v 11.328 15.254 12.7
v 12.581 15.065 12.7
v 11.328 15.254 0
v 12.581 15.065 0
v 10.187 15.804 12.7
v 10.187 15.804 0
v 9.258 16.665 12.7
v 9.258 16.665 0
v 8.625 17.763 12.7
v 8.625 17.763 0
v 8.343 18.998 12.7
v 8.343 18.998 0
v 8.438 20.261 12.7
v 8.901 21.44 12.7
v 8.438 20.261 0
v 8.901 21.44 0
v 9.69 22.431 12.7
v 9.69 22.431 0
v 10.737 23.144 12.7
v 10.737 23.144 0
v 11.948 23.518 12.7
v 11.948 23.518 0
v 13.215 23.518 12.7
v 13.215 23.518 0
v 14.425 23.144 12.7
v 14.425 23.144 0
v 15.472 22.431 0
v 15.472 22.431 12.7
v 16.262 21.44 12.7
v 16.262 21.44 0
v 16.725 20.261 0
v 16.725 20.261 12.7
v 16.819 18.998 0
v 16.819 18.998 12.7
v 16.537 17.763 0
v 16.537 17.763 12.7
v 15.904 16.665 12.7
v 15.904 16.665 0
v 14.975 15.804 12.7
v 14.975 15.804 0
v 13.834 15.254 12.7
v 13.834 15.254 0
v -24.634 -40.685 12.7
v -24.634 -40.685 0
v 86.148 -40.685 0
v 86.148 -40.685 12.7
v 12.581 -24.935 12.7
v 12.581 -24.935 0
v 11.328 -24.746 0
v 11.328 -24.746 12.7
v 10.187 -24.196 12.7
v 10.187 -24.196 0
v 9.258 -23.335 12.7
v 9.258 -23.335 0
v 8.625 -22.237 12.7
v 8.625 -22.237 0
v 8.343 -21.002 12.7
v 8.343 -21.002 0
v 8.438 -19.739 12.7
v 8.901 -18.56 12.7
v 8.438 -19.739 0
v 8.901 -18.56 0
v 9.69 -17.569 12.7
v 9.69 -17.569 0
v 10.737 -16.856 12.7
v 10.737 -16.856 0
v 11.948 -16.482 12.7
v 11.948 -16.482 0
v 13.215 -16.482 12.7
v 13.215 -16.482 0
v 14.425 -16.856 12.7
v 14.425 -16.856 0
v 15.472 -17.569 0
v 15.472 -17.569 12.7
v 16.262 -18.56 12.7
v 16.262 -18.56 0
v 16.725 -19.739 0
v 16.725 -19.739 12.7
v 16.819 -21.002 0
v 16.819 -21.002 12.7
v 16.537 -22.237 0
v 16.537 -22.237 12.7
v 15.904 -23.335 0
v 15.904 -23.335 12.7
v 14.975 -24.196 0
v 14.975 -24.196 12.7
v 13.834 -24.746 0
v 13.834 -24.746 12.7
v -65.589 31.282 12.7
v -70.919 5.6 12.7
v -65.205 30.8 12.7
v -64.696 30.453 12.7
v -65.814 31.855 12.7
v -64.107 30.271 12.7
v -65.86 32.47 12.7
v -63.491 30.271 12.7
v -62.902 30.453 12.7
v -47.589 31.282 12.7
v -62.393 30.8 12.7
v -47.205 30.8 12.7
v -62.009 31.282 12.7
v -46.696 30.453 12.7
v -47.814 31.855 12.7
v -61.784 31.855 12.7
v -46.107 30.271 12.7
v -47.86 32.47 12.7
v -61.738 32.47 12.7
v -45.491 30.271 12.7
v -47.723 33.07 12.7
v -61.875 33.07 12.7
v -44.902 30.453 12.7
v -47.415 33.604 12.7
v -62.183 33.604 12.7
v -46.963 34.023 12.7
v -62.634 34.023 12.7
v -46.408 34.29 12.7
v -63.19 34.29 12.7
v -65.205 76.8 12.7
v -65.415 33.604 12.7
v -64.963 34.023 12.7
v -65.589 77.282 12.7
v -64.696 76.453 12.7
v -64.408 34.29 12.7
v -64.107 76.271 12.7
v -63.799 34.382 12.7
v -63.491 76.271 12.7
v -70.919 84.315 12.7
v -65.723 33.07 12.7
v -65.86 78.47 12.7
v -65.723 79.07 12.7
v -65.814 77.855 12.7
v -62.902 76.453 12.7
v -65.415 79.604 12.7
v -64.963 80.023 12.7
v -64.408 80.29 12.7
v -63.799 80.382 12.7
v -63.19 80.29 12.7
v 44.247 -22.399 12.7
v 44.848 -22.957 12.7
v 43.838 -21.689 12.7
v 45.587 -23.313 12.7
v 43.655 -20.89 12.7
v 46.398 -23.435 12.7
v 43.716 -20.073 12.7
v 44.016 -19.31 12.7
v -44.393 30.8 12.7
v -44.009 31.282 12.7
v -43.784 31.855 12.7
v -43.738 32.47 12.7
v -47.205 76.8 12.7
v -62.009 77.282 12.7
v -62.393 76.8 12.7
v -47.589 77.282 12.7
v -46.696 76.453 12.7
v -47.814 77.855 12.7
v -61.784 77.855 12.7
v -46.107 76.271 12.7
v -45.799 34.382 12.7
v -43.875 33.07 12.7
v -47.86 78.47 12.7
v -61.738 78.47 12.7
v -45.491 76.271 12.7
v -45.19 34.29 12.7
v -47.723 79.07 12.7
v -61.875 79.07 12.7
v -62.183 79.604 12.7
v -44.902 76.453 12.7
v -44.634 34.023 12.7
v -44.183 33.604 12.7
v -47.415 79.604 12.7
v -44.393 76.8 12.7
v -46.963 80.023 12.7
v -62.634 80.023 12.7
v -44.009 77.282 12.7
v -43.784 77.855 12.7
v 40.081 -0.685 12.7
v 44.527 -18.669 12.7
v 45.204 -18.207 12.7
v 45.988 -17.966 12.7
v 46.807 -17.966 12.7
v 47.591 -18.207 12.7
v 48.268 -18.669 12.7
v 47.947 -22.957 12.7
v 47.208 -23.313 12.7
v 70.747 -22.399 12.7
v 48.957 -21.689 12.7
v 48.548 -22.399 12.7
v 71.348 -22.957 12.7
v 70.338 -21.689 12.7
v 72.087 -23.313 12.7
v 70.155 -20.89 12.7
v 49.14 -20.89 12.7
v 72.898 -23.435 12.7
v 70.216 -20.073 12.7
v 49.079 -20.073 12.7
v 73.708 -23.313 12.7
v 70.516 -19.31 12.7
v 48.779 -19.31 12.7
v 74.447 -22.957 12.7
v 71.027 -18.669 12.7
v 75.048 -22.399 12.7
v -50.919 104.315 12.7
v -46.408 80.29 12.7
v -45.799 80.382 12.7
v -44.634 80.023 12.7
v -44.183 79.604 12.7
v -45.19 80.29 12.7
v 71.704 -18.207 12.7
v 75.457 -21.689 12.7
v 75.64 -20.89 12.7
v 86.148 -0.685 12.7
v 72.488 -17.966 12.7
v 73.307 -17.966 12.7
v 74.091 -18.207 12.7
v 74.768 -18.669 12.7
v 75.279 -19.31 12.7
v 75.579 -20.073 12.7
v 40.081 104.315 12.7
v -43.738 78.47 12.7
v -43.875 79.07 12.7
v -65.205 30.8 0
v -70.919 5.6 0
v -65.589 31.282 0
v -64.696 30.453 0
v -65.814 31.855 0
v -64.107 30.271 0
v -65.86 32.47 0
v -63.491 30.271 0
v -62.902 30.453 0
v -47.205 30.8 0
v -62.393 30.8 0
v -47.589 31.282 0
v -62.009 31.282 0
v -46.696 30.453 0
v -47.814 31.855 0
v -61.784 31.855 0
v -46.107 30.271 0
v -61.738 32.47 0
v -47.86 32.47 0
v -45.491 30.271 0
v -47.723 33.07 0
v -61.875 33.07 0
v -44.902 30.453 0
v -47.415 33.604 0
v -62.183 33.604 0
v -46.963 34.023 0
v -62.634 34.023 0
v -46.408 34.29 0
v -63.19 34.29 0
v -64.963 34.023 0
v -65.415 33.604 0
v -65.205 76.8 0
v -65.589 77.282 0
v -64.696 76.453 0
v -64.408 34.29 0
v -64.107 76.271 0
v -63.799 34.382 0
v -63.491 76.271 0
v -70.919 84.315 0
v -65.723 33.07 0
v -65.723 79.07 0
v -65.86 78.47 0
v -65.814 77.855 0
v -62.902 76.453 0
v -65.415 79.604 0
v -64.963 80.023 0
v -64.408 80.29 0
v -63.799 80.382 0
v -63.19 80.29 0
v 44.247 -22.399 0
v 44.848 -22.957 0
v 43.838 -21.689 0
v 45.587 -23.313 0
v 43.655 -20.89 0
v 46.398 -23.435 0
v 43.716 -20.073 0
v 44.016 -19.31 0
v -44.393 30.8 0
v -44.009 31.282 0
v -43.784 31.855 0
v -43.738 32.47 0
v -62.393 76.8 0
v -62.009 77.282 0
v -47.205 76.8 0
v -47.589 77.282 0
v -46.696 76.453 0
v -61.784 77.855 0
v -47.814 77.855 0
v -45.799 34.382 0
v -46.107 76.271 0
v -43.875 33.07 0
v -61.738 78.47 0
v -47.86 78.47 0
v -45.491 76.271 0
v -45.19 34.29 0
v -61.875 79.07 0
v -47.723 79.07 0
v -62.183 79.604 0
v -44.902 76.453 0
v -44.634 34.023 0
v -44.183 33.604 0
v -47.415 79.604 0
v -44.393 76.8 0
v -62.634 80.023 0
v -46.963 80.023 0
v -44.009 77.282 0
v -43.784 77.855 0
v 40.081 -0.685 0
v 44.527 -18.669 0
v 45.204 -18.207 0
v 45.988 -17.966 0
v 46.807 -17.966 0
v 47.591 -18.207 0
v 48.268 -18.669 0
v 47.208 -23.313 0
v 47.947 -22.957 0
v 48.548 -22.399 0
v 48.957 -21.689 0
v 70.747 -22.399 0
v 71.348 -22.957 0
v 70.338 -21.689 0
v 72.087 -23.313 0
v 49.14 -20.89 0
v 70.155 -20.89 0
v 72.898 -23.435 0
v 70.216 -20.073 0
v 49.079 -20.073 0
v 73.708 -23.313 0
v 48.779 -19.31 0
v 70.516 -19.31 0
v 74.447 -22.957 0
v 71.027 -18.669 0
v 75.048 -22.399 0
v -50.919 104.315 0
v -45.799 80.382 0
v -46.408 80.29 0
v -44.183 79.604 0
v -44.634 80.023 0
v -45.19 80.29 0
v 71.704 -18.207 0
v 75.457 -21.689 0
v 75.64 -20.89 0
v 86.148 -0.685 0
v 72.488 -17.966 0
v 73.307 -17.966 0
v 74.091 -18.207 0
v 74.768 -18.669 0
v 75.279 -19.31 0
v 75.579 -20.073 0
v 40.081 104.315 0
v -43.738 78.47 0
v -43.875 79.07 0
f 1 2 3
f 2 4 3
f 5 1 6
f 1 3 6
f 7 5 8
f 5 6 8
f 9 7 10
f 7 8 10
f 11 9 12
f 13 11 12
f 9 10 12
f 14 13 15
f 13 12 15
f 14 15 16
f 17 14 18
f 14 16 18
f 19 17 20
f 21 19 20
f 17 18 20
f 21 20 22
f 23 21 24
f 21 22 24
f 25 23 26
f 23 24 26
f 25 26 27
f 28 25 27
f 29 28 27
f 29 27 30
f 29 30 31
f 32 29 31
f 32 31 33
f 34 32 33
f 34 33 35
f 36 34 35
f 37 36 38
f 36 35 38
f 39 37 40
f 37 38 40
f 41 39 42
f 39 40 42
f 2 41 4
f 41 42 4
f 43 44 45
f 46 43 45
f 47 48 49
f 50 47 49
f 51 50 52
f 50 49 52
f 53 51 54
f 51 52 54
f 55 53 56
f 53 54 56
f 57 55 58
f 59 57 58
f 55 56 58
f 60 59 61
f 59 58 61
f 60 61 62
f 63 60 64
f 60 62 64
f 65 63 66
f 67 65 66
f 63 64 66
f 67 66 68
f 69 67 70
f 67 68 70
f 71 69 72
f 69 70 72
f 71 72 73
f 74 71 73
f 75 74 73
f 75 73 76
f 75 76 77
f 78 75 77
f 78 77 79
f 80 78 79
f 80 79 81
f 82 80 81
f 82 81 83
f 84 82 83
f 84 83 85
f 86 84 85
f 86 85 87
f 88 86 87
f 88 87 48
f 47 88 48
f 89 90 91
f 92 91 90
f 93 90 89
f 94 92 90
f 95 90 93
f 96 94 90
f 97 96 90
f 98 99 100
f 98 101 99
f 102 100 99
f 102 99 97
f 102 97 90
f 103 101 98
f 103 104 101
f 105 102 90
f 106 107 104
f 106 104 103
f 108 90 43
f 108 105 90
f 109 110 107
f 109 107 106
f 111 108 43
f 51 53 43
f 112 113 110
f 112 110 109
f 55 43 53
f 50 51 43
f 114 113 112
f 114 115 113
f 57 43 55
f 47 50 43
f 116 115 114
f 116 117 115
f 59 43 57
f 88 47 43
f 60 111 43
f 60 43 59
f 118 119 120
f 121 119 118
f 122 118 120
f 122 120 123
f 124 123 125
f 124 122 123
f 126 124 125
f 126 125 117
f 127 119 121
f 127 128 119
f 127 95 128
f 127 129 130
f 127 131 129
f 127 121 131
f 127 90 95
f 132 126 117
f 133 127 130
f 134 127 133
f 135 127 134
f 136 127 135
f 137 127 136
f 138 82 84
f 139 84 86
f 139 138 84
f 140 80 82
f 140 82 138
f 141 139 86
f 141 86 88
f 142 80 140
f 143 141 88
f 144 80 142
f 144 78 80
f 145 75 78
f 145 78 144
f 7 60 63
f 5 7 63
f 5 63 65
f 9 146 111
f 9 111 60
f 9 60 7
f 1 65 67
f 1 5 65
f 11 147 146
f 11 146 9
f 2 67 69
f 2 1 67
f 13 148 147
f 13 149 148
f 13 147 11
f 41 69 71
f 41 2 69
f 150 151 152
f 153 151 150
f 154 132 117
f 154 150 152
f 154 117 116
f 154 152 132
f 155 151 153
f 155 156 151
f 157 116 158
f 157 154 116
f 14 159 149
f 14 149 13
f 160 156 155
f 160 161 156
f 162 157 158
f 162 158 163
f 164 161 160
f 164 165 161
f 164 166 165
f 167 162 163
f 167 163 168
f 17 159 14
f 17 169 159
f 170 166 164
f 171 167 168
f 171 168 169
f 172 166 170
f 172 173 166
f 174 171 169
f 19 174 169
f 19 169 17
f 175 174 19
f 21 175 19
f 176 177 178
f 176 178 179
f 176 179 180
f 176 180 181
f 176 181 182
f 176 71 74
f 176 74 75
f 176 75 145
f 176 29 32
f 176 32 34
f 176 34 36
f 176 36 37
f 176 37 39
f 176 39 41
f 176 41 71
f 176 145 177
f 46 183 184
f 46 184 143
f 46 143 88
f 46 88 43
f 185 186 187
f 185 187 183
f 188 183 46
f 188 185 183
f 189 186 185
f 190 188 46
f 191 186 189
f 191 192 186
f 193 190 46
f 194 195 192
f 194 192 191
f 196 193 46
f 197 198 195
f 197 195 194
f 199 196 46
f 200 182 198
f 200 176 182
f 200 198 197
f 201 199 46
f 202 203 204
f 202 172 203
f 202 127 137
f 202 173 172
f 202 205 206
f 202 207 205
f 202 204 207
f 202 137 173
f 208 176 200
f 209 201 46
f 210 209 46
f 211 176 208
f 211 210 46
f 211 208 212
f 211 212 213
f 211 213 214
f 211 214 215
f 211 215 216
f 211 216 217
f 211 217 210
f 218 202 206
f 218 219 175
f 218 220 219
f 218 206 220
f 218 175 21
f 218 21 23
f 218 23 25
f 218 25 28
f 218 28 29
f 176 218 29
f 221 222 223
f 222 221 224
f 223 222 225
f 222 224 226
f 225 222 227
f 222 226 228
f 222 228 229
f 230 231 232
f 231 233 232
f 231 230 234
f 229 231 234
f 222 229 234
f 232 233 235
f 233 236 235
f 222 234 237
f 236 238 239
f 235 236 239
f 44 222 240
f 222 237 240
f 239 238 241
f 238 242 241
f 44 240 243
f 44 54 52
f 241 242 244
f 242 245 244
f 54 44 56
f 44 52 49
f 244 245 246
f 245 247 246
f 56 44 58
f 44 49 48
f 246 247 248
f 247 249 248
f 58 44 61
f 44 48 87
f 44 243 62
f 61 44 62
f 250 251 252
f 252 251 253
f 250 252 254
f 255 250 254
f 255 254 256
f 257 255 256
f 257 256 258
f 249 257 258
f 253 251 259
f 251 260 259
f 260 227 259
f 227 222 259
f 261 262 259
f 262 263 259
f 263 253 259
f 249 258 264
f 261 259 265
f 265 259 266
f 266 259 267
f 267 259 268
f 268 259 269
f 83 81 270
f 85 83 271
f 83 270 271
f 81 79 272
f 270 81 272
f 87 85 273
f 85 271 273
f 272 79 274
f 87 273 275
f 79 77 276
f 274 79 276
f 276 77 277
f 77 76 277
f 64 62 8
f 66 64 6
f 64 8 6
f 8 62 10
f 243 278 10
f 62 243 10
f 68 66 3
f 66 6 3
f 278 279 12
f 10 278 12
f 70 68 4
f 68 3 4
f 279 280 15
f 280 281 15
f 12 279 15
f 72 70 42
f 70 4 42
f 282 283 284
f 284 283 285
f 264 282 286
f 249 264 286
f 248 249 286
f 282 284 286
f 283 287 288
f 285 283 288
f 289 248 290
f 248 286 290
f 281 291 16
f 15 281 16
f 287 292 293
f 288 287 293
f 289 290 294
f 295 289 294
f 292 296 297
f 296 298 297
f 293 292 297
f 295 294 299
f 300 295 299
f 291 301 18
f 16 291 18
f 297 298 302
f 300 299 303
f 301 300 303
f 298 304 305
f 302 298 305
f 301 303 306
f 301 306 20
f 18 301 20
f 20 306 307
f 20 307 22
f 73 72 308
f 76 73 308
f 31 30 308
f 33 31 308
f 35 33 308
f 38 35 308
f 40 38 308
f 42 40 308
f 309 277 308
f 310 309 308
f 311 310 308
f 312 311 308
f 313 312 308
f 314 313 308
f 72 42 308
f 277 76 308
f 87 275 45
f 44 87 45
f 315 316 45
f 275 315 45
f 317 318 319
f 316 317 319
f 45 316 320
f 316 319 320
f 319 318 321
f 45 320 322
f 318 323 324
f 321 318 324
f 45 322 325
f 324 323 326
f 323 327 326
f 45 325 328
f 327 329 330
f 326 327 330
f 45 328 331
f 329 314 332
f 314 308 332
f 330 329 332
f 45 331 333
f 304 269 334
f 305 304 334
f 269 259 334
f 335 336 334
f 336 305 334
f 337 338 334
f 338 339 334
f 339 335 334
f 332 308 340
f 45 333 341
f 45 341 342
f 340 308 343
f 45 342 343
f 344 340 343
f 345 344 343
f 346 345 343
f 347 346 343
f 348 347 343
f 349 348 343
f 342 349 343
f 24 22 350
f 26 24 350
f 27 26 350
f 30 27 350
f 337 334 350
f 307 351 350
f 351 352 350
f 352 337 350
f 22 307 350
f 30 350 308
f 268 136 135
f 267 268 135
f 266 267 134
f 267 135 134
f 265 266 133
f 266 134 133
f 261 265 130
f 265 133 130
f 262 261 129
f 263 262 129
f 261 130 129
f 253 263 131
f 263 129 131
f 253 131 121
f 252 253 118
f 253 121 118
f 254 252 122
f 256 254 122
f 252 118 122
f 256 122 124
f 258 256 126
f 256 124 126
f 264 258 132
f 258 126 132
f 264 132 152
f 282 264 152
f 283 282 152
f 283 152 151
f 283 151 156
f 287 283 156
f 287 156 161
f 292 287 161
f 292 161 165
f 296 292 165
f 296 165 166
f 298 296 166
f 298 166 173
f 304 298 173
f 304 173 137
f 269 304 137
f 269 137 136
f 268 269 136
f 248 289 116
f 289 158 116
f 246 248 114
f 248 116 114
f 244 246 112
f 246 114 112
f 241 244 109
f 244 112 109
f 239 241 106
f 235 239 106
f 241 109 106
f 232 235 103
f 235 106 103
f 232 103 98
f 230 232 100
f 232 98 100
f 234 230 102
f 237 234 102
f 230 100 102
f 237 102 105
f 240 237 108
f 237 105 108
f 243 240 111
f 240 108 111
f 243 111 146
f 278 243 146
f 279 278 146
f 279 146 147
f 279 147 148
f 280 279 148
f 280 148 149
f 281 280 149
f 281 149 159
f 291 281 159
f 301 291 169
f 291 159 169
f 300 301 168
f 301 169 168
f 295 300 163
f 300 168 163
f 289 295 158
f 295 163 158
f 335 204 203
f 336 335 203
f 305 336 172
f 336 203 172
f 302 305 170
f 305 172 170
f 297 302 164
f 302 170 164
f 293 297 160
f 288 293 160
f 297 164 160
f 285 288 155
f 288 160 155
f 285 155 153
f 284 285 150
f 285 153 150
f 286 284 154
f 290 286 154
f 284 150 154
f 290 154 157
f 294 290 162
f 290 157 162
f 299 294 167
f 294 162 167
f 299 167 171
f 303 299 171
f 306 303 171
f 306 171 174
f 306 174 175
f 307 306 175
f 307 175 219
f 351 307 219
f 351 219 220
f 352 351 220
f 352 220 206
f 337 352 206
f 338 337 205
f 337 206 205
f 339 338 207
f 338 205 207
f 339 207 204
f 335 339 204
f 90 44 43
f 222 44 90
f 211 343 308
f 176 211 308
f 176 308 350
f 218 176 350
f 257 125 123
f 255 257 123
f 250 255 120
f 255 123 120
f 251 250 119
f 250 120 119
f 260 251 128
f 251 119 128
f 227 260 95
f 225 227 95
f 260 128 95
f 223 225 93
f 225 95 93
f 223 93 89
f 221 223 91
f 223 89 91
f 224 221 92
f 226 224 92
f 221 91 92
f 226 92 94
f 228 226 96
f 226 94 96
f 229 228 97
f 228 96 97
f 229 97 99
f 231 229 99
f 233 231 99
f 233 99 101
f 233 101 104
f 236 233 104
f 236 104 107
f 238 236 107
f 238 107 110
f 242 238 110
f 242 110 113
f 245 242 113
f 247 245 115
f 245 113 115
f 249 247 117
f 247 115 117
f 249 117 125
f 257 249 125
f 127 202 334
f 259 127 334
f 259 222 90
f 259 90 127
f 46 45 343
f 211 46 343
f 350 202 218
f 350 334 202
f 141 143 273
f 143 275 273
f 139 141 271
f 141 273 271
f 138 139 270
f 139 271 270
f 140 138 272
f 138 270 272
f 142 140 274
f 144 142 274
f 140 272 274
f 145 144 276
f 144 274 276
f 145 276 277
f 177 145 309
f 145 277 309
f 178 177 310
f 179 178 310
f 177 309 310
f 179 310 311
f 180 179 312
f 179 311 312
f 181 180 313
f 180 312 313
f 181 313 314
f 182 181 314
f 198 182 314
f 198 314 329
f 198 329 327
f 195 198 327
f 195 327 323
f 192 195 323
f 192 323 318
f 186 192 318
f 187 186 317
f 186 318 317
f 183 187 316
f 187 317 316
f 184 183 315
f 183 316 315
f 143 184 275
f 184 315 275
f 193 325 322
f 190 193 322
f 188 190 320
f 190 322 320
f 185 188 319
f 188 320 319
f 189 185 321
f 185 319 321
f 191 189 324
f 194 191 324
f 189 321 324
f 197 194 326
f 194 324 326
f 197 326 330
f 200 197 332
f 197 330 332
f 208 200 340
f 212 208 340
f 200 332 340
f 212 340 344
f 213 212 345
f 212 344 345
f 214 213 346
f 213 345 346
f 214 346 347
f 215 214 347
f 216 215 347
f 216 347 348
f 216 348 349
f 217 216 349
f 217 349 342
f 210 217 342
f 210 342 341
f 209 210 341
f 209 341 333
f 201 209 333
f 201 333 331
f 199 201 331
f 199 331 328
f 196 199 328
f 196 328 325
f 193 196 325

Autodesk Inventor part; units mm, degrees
ref_plane "YZ Plane" through (0, 0, 0) normal (1, 0, 0) x (0, 1, 0)
ref_plane "XZ Plane" through (0, 0, 0) normal (0, 1, 0) x (-1, 0, 0)
ref_plane "XY Plane" through (0, 0, 0) normal (0, 0, 1) x (1, 0, 0)
sketch "Esboço1" plane through (0, 0, 0) normal (0, 0, 1) x (1, 0, 0)
  line L0 (-70.9188, 104.3152) -> (40.0812, 104.3152)
  line L1 (-70.9188, 5.5999) -> (-70.9188, 104.3152)
  line L2 (-24.6341, -40.6848) -> (86.1475, -40.6848)
  line L3 (86.1475, -40.6848) -> (86.1475, -0.6848)
  line L4 (86.1475, -0.6848) -> (40.0812, -0.6848)
  line L5 (40.0812, -0.6848) -> (40.0812, 104.3152)
  line L6 (-24.6341, -40.6848) -> (-70.9188, 5.5999)
  line L7 (-24.6341, -40.6848) -> (40.8222, -40.6848) construction
  point P0 (0, 0)
  dimension "d0" = 111
  dimension "d5" = 40
  dimension "d6" = 105
  dimension "d7" = 135
  dimension "d8" = 98.7154
  dimension "d11" = 157.0662
extrude "Extrusão1" add sketch "Esboço1" along normal blind 12.7
chamfer "Chanfro1" distance 20 angle 45 1 edges at (-70.9188, 104.3152, 6.35)
sketch "Esboço2" plane through (0, 0, 0) normal (0, 0, -1) x (-1, 0, 0)
  circle A0 centre (45.7988, 78.3152) radius 2.75 construction
  circle A1 centre (63.7988, 78.3152) radius 2.75 construction
  circle A2 centre (63.7988, 32.3152) radius 2.75 construction
  circle A3 centre (45.7988, 32.3152) radius 2.75 construction
  point P0 (0, 0)
hole "Furo1" at (-45.7988, 78.3152, 0) at (-63.7988, 78.3152, 0) at (-45.7988, 32.3152, 0) at (-63.7988, 32.3152, 0) direction (0, 0, 1) diameter 4.134 end through all thread size "M5x0.8" class "6H" standard "ISO Metric profile"
sketch "Esboço3" plane through (0, 0, 12.7) normal (0, 0, 1) x (1, 0, 0)
  circle A0 centre (12.5812, -20.6848) radius 4.25 construction
  circle A1 centre (12.5812, 19.3152) radius 4.25 construction
  line L0 (40.0812, -0.6848) -> (40.0812, 104.3152) projected
  line L1 (-24.6341, -40.6848) -> (86.1475, -40.6848) projected
  point P0 (0, 0)
  dimension "d22" = 27.5
  dimension "d23" = 27.5
  dimension "d24" = 60
  dimension "d25" = 20
hole "Furo2" at (12.5812, 19.3152, 12.7) at (12.5812, -20.6848, 12.7) direction (0, 0, -1) diameter 8.5 end through all
sketch "Esboço4" plane through (0, 0, 12.7) normal (0, 0, 1) x (1, 0, 0)
  circle A0 centre (46.3975, -20.6848) radius 2.75 construction
  circle A1 centre (72.8975, -20.6848) radius 2.75 construction
  line L0 (86.1475, -40.6848) -> (86.1475, -0.6848) projected
  line L1 (86.1475, -0.6848) -> (40.0812, -0.6848) projected
  line L2 (-24.6341, -40.6848) -> (86.1475, -40.6848) projected
  point P0 (0, 0)
  dimension "d33" = 13.25
  dimension "d34" = 39.75
  dimension "d35" = 20
  dimension "d36" = 20
hole "Furo3" at (46.3975, -20.6848, 12.7) at (72.8975, -20.6848, 12.7) direction (0, 0, -1) diameter 5.5 end through all
properties part number "SUPORTE_MANCAL_FRONTAL"
